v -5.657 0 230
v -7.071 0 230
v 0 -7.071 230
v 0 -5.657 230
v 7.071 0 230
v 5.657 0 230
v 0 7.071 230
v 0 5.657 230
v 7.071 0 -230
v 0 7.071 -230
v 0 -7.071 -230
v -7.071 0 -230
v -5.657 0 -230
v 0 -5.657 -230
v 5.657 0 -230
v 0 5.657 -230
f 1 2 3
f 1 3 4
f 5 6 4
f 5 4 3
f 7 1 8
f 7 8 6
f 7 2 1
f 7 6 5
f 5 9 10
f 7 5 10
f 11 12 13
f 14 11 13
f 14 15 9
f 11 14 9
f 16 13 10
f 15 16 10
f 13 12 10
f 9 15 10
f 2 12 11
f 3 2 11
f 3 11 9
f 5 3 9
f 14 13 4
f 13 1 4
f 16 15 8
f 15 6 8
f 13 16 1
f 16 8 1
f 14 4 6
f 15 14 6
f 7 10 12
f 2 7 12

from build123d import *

# Parameters (mm, degrees)
EXTRUDE_THIN1_DEPTH = 230


with BuildPart() as part:
    # Sketch1 → Extrude-Thin1 (new, symmetric)
    with BuildSketch(Plane.XY):
        Polygon((0, -7.071067812), (7.071067812, 0), (0, 7.071067812), (-7.071067812, 0), align=None)
        Polygon((0, -5.656854249), (5.656854249, 0), (0, 5.656854249), (-5.656854249, 0), align=None, mode=Mode.SUBTRACT)
    extrude(amount=EXTRUDE_THIN1_DEPTH, both=True)


solid = part.part
